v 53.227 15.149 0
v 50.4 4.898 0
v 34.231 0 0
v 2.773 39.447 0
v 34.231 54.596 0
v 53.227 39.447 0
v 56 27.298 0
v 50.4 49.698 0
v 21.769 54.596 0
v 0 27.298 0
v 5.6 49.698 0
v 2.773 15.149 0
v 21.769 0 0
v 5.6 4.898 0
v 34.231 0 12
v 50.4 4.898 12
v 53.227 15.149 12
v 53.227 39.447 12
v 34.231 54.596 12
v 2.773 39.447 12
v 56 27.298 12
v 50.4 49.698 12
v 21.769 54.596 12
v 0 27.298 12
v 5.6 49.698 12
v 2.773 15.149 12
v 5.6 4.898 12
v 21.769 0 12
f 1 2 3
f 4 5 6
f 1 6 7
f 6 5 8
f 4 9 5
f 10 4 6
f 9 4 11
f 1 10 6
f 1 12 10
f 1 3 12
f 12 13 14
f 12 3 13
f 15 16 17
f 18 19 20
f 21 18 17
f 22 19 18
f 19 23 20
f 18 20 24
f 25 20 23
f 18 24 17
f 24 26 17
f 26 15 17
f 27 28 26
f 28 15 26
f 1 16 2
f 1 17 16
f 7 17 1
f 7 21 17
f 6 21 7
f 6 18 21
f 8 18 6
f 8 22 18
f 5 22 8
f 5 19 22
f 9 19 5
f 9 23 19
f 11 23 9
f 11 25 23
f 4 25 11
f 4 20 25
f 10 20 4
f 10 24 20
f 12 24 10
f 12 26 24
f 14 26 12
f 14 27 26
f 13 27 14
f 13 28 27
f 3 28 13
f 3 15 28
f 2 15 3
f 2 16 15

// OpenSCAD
$fn = 32;

// ----------------------------------------------------------------------
// Flat adaptor: hex_disc, 12 mm thick
// ----------------------------------------------------------------------

// --- parameters (mm) ---
profile_height = 12;      // extrusion height
profile_points = 14;      // points of the closed outline

profile = [[0, 27.298], [2.773, 15.149], [5.6, 4.898], [21.769, 0], [34.231, 0], [50.4, 4.898], [53.227, 15.149], [56, 27.298], [53.227, 39.447], [50.4, 49.698], [34.231, 54.596], [21.769, 54.596], [5.6, 49.698], [2.773, 39.447]];  // single closed polygon, 14 points, counter clockwise

// --- the one profile operation ---
linear_extrude(height = profile_height) polygon(points = profile);
